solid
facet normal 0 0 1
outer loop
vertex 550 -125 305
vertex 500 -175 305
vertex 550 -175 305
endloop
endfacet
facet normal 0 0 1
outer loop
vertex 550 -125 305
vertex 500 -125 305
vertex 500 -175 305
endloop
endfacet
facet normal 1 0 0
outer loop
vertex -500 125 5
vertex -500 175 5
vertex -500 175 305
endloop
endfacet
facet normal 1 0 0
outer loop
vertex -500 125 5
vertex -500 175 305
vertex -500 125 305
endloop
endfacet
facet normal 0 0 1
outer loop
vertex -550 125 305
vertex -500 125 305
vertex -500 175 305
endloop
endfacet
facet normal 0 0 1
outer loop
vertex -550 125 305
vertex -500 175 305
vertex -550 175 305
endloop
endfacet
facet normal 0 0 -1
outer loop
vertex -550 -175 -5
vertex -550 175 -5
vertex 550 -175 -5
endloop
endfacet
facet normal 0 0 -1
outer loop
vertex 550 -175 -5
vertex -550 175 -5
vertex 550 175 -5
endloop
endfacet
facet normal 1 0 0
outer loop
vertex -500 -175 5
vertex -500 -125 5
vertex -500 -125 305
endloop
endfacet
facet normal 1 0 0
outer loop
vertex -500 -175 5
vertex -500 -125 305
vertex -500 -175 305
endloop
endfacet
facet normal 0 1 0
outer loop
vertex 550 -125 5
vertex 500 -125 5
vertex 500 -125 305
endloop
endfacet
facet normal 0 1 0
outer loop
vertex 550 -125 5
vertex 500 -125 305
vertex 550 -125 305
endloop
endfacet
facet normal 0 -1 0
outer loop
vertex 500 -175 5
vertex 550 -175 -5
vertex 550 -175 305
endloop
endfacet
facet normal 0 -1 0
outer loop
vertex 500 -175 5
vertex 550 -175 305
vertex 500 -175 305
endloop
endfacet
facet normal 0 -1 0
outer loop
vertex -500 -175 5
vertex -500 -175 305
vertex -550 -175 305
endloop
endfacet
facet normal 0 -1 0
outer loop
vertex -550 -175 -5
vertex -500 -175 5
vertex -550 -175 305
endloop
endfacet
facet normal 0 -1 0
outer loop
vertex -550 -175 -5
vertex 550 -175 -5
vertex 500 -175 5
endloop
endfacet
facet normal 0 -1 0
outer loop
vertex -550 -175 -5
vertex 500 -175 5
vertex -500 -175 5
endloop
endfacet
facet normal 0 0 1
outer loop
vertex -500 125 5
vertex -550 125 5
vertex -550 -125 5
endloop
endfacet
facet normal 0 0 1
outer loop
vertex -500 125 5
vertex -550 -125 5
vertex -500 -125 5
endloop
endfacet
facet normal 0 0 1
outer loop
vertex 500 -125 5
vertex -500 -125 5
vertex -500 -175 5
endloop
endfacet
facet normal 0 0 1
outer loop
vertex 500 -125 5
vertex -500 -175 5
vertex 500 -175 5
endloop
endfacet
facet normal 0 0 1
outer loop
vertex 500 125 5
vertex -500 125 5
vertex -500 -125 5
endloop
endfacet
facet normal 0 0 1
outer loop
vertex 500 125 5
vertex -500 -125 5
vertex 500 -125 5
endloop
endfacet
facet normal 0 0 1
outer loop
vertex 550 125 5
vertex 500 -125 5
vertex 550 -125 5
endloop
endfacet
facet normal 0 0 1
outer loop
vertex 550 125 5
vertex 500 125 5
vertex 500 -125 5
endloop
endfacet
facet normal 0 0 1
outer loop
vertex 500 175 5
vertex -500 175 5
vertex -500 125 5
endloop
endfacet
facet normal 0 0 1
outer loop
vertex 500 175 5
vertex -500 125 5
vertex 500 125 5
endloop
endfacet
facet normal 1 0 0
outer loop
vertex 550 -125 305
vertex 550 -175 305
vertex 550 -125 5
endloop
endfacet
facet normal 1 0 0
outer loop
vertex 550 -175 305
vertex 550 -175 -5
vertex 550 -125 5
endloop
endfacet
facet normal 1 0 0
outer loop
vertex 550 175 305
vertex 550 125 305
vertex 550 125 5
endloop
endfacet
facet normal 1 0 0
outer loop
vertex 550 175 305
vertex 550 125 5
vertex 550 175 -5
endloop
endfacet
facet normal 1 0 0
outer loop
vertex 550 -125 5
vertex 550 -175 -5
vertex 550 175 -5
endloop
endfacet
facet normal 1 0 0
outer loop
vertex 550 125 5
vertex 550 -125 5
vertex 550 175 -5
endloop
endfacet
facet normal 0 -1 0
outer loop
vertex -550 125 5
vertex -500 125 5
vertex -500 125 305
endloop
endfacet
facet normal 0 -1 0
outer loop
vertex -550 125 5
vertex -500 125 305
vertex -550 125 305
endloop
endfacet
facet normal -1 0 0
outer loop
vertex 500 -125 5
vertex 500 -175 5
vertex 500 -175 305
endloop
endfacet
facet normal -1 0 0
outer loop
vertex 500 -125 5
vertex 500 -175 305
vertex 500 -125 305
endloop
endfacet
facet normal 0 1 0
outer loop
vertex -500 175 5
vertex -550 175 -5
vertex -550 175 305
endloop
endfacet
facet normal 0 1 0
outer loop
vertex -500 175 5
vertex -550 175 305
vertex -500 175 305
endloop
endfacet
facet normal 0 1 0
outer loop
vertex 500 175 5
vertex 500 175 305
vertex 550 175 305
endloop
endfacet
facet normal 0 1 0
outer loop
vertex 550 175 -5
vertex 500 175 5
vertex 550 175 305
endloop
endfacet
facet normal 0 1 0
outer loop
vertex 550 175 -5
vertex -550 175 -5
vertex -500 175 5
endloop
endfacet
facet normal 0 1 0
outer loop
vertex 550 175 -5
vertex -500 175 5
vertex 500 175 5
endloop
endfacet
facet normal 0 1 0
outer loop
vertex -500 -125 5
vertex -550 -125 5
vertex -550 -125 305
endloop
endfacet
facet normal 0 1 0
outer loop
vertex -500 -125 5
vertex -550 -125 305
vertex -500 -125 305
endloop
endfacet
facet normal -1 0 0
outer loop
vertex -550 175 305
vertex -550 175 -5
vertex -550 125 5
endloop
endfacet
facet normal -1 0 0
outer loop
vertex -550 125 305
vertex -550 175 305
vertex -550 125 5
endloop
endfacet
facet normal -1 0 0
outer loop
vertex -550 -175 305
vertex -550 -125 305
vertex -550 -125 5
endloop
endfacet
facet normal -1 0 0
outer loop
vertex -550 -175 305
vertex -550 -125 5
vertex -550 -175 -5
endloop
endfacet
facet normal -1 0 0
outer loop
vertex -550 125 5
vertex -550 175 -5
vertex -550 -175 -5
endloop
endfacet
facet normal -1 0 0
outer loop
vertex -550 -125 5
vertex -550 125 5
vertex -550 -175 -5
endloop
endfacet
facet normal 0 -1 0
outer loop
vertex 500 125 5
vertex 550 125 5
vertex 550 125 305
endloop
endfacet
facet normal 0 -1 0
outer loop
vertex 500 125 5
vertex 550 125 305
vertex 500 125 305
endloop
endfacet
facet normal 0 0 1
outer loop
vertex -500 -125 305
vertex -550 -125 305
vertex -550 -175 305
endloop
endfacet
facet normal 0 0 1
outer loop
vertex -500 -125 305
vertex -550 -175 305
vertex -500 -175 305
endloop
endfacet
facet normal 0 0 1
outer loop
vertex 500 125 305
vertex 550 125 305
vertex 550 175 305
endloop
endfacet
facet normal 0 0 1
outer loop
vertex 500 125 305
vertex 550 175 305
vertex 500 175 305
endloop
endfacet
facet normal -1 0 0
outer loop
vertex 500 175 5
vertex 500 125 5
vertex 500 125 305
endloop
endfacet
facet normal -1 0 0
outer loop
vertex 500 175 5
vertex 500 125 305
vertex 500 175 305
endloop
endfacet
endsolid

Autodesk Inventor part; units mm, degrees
ref_plane "YZ Plane" through (0, 0, 0) normal (1, 0, 0) x (0, 1, 0)
ref_plane "XZ Plane" through (0, 0, 0) normal (0, 1, 0) x (-1, 0, 0)
ref_plane "XY Plane" through (0, 0, 0) normal (0, 0, 1) x (1, 0, 0)
sketch "스케치1" plane through (0, 0, 0) normal (0, 0, 1) x (1, 0, 0)
  line L0 (-550, 175) -> (550, 175)
  line L1 (550, 175) -> (550, -175)
  line L2 (550, -175) -> (-550, -175)
  line L3 (-550, -175) -> (-550, 175)
  point P0 (0, 0)
  point P1 (550, 0)
  dimension "d0" = 1100
  dimension "d1" = 350
  dimension "d8" = 550
  dimension "d9" = 175
extrude "돌출1" add sketch "스케치1" along normal mid plane 10
sketch "스케치2" plane through (0, 0, 5) normal (0, 0, 1) x (1, 0, 0)
  line L0 (550, -175) -> (550, 175) projected
  line L1 (550, -175) -> (500, -175)
  line L2 (500, -175) -> (500, -125)
  line L3 (500, -125) -> (550, -125)
  line L4 (550, -125) -> (550, -175)
  point P0 (0, 0)
  dimension "d4" = 50
  dimension "d5" = 50
extrude "돌출2" add sketch "스케치2" along normal blind 300
sketch "스케치3" plane through (0, 0, 305) normal (0, 0, 1) x (1, 0, 0)
  point P0 (0, 0)
mirror "미러1" about plane through (0, 0, 0) normal (0, 1, 0) of "돌출2"
mirror "미러2" about plane through (0, 0, 0) normal (1, 0, 0) of "돌출2", "미러1"
equation "\"d8\" = 0.5 * d0"
equation "\"d9\" = 0.5 * d1"
properties part number "table"
